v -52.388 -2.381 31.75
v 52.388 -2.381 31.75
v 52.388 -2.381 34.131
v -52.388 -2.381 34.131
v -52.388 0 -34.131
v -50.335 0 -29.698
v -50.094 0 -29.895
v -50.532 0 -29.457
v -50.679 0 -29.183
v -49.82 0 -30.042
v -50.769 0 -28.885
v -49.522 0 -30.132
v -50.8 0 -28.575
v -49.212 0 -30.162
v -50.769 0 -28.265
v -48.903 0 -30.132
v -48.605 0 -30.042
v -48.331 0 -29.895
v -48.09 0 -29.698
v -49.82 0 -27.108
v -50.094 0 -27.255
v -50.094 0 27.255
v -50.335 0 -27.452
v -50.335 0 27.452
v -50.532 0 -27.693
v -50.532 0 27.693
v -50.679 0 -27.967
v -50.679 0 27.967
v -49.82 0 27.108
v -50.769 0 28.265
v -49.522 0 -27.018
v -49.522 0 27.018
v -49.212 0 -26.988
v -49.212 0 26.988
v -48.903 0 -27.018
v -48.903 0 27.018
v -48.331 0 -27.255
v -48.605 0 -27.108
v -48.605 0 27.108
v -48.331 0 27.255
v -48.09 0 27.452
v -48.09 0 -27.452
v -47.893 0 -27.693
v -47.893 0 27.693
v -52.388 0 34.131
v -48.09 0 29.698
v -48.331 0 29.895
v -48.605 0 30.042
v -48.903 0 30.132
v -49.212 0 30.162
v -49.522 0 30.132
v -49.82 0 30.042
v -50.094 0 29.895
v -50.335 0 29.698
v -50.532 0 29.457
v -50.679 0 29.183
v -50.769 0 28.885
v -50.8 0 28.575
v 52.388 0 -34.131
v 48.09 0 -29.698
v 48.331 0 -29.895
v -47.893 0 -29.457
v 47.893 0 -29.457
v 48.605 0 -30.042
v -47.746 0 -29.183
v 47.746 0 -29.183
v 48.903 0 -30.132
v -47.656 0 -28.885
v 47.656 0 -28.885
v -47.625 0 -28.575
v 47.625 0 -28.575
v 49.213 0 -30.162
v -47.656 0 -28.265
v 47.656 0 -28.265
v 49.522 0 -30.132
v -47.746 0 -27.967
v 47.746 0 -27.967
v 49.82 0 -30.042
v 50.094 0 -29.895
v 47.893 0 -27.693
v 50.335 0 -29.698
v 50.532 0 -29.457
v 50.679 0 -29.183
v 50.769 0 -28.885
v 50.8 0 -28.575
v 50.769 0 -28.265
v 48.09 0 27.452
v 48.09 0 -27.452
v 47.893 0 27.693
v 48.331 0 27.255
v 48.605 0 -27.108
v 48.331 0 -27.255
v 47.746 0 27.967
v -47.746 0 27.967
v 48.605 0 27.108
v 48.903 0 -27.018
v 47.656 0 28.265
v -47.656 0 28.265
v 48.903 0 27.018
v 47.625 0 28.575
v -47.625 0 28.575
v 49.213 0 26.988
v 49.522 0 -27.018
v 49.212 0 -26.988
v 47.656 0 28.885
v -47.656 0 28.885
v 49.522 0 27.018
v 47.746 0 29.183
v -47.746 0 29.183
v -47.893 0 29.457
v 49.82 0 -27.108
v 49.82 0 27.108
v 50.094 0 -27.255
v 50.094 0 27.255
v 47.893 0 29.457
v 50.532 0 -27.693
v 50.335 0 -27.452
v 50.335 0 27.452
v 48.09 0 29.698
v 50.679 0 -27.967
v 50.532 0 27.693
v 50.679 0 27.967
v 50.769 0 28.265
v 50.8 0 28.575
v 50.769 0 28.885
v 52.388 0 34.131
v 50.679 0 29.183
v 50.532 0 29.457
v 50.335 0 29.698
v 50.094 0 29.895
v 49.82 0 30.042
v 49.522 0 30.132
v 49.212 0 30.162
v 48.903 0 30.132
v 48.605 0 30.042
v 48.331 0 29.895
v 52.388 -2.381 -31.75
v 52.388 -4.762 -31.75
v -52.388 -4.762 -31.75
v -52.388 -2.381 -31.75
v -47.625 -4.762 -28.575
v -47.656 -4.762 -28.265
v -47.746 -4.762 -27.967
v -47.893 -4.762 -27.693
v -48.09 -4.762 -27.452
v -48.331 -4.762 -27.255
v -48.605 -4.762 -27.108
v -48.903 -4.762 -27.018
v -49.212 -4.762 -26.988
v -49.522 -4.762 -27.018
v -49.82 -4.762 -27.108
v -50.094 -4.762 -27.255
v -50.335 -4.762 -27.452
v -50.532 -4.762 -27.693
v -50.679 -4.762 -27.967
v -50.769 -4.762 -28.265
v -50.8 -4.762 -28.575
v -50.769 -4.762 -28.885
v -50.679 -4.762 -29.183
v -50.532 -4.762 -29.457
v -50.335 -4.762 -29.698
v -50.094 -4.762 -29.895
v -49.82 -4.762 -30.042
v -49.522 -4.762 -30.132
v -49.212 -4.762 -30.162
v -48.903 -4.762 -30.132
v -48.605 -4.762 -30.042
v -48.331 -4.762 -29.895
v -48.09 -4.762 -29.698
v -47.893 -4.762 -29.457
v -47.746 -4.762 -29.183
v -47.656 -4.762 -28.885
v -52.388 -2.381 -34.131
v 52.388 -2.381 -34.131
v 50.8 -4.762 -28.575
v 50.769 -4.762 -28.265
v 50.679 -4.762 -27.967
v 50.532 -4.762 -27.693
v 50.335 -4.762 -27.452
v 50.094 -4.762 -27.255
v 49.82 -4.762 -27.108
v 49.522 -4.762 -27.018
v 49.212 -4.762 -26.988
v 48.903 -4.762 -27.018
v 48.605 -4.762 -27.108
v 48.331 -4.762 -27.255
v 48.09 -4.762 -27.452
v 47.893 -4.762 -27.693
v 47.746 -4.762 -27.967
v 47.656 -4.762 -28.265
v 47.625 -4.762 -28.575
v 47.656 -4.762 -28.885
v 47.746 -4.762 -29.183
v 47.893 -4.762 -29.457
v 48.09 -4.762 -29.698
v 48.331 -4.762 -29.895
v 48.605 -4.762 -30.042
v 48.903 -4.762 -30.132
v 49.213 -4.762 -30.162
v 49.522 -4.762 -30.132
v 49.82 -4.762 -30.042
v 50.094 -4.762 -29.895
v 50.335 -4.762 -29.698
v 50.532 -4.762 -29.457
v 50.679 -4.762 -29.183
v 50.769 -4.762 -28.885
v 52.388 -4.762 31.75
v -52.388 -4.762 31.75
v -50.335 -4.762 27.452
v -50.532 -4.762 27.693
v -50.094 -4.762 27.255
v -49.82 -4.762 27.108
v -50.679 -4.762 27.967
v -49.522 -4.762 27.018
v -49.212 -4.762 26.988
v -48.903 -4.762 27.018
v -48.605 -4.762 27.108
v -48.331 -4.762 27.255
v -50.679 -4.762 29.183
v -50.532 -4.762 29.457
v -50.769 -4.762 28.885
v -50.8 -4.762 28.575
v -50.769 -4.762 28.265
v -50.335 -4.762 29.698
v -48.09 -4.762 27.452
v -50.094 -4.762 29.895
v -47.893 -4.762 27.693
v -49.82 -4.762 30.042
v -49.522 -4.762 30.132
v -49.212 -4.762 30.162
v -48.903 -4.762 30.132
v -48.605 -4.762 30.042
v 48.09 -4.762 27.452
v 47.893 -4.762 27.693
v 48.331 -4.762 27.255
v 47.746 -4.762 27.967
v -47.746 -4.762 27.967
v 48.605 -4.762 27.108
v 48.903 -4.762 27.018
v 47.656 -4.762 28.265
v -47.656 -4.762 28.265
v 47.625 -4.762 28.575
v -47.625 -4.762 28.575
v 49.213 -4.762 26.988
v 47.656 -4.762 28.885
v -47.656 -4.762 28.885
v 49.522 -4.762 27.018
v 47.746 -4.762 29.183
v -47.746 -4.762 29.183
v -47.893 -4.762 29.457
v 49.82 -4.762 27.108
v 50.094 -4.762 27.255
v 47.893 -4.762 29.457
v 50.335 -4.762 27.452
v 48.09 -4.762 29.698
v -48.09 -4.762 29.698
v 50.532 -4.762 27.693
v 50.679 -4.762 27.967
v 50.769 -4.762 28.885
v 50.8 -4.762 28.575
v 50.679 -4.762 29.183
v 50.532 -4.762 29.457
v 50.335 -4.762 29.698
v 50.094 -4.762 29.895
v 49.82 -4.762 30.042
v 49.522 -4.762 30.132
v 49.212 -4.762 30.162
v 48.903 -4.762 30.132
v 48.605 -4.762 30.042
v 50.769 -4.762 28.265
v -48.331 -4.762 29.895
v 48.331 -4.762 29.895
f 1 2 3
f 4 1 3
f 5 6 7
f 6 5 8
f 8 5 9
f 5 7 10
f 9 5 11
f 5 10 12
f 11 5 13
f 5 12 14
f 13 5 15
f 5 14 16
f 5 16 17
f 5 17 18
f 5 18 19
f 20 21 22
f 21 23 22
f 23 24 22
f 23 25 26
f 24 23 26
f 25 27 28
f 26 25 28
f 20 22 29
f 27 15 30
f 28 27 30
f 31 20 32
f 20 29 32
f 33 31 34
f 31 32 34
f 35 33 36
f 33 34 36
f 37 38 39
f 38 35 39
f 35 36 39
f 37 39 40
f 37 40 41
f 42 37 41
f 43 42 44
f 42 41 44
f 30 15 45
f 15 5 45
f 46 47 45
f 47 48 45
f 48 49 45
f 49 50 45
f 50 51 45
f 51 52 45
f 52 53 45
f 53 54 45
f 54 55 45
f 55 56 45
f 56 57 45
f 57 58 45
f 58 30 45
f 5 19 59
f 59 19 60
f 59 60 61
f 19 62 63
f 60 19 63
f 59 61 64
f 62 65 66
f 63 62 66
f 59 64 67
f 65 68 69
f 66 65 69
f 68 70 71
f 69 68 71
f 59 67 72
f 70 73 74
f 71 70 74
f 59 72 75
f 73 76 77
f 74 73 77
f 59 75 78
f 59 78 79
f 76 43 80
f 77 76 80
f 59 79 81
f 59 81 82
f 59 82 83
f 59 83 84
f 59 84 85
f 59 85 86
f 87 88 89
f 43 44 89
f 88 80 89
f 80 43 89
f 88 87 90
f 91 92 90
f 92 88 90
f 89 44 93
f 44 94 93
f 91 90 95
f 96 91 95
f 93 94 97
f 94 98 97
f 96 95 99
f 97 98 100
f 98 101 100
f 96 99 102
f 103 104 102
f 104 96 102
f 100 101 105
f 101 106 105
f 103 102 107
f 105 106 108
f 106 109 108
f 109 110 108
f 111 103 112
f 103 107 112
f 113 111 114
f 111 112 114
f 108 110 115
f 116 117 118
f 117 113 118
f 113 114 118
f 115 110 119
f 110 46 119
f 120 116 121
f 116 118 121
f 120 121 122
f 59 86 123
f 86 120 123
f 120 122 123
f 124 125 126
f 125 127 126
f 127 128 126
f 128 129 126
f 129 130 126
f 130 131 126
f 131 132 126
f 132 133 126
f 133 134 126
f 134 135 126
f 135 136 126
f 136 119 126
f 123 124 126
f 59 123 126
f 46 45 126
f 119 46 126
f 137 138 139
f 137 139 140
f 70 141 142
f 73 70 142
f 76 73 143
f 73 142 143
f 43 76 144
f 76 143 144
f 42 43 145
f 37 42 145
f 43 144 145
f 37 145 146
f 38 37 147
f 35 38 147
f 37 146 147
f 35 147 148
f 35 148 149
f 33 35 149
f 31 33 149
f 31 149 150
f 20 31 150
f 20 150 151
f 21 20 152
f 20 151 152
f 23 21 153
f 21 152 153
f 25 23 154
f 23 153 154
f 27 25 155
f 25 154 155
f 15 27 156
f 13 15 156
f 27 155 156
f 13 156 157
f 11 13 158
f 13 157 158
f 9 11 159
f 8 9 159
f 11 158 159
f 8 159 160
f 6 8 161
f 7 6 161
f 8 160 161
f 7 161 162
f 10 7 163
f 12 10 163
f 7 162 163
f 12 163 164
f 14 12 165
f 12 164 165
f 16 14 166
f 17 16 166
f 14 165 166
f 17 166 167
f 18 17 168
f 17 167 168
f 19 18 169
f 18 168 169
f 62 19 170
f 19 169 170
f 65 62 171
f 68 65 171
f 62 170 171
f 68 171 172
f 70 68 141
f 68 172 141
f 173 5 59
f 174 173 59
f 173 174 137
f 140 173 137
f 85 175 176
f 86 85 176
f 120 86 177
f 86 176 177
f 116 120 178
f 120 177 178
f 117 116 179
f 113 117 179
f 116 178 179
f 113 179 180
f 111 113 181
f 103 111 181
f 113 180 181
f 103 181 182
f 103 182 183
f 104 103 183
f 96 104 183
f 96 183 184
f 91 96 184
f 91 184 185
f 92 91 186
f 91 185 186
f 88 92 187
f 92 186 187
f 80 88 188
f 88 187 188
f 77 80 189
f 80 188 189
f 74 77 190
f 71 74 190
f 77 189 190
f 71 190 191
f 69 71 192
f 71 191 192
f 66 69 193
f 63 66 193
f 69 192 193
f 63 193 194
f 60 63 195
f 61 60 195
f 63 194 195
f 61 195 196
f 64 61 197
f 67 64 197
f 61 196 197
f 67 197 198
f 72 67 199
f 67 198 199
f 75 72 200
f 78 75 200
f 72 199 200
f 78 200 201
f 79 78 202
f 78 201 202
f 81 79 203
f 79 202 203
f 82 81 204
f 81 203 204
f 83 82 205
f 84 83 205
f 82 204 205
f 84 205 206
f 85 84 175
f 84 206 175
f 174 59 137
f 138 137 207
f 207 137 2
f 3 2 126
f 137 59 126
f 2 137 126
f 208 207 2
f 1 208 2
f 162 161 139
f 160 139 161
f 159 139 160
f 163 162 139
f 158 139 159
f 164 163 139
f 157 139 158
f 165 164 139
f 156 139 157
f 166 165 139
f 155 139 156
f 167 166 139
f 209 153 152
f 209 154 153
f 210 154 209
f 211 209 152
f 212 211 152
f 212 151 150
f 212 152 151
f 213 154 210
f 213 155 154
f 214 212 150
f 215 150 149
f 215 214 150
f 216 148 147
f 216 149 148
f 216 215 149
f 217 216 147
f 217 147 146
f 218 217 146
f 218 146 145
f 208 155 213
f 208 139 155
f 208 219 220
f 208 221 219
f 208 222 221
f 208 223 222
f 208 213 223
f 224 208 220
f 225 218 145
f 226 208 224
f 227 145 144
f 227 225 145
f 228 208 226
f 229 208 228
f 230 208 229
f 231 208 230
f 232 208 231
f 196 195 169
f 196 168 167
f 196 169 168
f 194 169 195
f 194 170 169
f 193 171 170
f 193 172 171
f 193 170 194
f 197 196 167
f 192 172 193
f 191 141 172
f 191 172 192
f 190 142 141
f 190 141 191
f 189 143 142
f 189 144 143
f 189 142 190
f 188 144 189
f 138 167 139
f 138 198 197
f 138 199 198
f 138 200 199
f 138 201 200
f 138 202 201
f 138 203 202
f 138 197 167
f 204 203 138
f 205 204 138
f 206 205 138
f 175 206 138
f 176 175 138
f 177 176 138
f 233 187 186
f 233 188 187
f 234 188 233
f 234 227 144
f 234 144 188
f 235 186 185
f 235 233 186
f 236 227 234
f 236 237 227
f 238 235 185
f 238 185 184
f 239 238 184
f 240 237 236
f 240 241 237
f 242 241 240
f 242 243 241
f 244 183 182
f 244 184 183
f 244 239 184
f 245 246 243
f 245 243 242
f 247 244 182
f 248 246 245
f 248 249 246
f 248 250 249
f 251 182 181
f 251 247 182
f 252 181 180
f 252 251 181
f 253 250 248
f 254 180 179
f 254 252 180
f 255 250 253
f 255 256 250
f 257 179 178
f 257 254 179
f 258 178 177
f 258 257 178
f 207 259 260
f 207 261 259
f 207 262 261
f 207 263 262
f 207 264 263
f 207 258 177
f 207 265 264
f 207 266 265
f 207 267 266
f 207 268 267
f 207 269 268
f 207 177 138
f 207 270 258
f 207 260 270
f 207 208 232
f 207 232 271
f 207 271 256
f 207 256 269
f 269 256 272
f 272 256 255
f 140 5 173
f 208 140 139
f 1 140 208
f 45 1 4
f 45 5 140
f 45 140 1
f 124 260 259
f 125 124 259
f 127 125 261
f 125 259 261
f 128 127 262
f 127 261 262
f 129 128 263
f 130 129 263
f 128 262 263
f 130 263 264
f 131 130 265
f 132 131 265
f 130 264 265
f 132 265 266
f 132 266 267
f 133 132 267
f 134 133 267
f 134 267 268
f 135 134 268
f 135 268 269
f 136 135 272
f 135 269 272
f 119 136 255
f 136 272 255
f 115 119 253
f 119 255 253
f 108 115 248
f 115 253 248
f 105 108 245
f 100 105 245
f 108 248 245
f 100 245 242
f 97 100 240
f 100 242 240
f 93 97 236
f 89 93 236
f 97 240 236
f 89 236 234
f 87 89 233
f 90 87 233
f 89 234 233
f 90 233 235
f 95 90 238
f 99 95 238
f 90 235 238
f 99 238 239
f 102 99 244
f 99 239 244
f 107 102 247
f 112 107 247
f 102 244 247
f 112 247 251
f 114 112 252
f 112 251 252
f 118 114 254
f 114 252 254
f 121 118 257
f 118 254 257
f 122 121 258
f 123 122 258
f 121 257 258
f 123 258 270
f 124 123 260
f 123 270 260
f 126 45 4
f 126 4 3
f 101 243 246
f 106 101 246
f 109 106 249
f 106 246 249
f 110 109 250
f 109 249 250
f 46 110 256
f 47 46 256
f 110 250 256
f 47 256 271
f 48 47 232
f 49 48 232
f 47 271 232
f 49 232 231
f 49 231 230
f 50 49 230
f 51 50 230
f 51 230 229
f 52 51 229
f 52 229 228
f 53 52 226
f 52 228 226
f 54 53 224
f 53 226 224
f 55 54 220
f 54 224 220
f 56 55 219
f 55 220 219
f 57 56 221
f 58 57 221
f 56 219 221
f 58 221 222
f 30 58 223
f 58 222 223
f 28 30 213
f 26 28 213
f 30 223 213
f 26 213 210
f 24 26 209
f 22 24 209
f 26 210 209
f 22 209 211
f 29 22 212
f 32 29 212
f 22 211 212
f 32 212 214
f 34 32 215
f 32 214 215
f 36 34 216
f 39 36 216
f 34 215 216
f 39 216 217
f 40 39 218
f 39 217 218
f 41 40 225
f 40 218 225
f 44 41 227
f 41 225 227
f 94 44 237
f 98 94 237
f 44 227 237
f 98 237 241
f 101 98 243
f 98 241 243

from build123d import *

# Parameters (mm, degrees)
F0_W     = 104.775
F0_H     = 68.2625
F1_DEPTH = 4.7625
F2_W     = 2.38125
F2_H     = 2.38125
F3_DEPTH = 104.775
F4_R     = 1.5875
F5_DEPTH = 4.7625


with BuildPart() as f1:
    # F0 (on Front) → F1 (new body)
    with BuildSketch(Plane.XZ):
        Rectangle(F0_W, F0_H)
    extrude(amount=F1_DEPTH)

    # F2 (on face) → F3 (cut, through all)
    with BuildSketch(Plane.YZ.offset(52.3875)):
        with Locations((-3.571875, 32.940625)):
            Rectangle(F2_W, F2_H)
        with Locations((-3.571875, -32.940625)):
            Rectangle(F2_W, F2_H)
    extrude(amount=-F3_DEPTH, mode=Mode.SUBTRACT)

    # F4 (on face) → F5 (cut, through all)
    with BuildSketch(Plane.XZ.offset(4.7625)):
        with Locations((-49.2125, 28.575)):
            Circle(F4_R)
        with Locations((49.2125, 28.575)):
            Circle(F4_R)
        with Locations((-49.2125, -28.575)):
            Circle(F4_R)
        with Locations((49.2125, -28.575)):
            Circle(F4_R)
    extrude(amount=-F5_DEPTH, mode=Mode.SUBTRACT)


solid = f1.part
